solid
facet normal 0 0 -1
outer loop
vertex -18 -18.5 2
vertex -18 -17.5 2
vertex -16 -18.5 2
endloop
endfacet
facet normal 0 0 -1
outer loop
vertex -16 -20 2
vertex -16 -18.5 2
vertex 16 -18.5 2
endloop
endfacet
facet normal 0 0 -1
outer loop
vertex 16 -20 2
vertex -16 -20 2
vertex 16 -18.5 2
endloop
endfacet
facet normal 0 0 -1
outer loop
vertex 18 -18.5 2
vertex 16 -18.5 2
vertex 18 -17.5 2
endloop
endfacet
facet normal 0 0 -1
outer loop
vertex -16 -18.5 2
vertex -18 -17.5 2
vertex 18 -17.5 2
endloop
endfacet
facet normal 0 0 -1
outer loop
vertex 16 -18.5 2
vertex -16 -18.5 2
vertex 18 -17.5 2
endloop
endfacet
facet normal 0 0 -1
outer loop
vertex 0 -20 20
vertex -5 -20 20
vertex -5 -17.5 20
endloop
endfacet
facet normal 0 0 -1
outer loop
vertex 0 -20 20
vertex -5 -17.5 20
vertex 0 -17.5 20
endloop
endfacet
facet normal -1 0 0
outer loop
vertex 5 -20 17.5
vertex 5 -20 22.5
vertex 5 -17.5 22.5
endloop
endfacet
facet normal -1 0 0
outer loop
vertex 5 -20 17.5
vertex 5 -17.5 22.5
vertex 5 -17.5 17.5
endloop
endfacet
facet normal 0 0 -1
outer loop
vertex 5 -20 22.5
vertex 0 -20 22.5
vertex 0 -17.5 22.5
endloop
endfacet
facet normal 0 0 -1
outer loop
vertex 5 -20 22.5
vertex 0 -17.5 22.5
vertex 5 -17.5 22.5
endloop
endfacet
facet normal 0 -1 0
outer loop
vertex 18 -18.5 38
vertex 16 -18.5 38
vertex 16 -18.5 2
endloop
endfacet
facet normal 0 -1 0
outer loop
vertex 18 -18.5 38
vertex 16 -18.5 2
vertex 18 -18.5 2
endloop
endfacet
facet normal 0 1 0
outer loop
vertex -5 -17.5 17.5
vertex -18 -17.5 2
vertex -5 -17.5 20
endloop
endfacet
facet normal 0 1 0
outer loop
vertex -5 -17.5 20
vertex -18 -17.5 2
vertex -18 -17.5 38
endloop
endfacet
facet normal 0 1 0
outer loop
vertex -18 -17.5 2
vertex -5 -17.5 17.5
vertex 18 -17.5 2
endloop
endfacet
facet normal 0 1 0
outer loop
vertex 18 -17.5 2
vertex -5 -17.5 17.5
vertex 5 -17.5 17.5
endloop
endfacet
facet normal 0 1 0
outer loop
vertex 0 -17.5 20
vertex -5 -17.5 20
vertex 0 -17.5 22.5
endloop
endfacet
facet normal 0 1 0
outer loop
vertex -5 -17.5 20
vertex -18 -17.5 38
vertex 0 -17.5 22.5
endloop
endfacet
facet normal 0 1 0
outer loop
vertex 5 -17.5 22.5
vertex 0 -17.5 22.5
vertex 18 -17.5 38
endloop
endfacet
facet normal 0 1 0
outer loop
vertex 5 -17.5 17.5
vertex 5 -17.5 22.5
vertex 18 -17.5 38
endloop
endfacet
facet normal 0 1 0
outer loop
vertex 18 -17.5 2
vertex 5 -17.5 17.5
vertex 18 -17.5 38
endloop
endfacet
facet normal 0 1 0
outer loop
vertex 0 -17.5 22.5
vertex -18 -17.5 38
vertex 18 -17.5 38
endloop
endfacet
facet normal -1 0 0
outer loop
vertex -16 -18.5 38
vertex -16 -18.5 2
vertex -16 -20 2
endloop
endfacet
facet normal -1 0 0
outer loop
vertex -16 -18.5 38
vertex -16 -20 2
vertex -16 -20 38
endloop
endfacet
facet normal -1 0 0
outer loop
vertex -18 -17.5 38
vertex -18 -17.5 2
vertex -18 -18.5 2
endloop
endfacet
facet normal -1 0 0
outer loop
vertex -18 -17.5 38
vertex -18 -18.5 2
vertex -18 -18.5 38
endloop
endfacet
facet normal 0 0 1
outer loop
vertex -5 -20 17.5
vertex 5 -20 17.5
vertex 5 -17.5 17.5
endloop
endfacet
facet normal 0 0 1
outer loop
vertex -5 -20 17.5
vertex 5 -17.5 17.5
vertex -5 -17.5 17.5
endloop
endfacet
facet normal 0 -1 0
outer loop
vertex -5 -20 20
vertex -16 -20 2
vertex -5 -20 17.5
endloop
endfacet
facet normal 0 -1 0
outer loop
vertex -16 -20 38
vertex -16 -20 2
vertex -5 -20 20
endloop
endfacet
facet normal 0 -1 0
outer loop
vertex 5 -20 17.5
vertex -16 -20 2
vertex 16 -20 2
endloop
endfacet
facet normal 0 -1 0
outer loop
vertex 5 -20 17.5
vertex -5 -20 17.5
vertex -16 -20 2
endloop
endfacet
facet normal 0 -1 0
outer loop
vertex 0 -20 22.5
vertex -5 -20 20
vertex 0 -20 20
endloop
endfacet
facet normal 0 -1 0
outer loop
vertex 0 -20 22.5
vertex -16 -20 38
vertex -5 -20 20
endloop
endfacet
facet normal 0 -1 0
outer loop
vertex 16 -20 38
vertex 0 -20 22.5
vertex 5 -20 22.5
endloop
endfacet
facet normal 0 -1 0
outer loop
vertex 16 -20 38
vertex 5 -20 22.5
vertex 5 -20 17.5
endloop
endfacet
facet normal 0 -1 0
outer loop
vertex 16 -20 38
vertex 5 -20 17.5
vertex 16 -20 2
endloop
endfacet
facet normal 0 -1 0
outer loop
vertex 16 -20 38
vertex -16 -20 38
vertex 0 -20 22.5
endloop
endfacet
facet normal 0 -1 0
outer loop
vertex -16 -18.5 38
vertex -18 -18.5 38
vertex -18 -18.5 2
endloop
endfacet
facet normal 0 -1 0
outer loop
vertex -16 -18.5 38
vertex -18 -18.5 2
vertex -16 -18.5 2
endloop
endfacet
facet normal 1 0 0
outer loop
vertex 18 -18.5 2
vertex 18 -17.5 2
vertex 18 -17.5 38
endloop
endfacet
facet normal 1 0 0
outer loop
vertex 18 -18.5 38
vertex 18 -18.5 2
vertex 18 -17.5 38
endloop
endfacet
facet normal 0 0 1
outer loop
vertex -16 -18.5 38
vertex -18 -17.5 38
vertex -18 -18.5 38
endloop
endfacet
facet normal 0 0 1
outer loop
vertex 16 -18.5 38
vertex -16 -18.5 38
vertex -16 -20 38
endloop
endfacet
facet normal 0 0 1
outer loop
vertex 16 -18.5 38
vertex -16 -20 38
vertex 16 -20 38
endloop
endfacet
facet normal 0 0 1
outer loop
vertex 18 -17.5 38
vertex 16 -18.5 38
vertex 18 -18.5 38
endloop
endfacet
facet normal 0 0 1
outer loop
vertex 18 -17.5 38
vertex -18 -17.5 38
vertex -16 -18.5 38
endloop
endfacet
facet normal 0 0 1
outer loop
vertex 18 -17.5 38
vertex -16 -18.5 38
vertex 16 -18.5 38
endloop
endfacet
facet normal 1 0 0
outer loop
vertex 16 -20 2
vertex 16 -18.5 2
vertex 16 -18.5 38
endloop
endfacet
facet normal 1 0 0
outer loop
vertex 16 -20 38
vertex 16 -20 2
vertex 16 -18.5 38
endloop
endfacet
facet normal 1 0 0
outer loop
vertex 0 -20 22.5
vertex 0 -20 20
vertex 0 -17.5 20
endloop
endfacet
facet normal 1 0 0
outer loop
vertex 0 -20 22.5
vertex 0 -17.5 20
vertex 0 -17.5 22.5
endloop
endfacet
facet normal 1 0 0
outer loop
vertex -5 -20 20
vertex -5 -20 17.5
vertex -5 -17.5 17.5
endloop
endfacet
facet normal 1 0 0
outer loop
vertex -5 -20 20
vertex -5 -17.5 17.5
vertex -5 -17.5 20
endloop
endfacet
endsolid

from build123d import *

# Parameters (mm, degrees)
SKETCH021_W                    = 32
SKETCH021_H                    = 36
EXTRUDE019_DEPTH               = 1.5
SKETCH020_W                    = 36
SKETCH020_H                    = 36
EXTRUDE018_DEPTH               = 1
FUSION011_PLACEMENT_ANGLE      = 90
BASEFEATURE002_PLACEMENT_ANGLE = 90
POCKET002_DEPTH                = 5
BODY003_PLACEMENT_ANGLE        = 90


with BuildPart() as extrude019:
    # Sketch021 (on Face6 of Extrude018) → Extrude019 (new body)
    with BuildSketch(Plane.XY.offset(1)):
        Rectangle(SKETCH021_W, SKETCH021_H)
    extrude(amount=EXTRUDE019_DEPTH)


with BuildPart() as body003:
    # Sketch020 → Extrude018 (new body)
    with BuildSketch(Plane.XY):
        Rectangle(SKETCH020_W, SKETCH020_H)
    extrude(amount=EXTRUDE018_DEPTH)

    # Fusion011: union Extrude019
    add(extrude019.part)


with BuildPart() as body003_1:
    # Fusion011 placement: moved
    add(body003.part.moved(Location((0, -17.5, 20))).rotate(Axis((0, -17.5, 20), (1, 0, 0)), FUSION011_PLACEMENT_ANGLE))


with BuildPart() as body003_2:
    # BaseFeature002 placement: moved
    add(body003_1.part.moved(Location((0, -20, -17.5))).rotate(Axis((0, -20, -17.5), (-1, 0, 0)), BASEFEATURE002_PLACEMENT_ANGLE))

    # Sketch026 (on Face8 of BaseFeature002) → Pocket002 (cut)
    with BuildSketch(Plane.XY.offset(2.5)):
        Polygon((0, 0), (0, 2.5), (5, 2.5), (5, -2.5), (-5, -2.5), (-5, 0), align=None)
    extrude(amount=-POCKET002_DEPTH, mode=Mode.SUBTRACT)


with BuildPart() as body003_3:
    # Body003 placement: moved
    add(body003_2.part.moved(Location((0, -17.5, 20))).rotate(Axis((0, -17.5, 20), (1, 0, 0)), BODY003_PLACEMENT_ANGLE))


solid = body003_3.part
